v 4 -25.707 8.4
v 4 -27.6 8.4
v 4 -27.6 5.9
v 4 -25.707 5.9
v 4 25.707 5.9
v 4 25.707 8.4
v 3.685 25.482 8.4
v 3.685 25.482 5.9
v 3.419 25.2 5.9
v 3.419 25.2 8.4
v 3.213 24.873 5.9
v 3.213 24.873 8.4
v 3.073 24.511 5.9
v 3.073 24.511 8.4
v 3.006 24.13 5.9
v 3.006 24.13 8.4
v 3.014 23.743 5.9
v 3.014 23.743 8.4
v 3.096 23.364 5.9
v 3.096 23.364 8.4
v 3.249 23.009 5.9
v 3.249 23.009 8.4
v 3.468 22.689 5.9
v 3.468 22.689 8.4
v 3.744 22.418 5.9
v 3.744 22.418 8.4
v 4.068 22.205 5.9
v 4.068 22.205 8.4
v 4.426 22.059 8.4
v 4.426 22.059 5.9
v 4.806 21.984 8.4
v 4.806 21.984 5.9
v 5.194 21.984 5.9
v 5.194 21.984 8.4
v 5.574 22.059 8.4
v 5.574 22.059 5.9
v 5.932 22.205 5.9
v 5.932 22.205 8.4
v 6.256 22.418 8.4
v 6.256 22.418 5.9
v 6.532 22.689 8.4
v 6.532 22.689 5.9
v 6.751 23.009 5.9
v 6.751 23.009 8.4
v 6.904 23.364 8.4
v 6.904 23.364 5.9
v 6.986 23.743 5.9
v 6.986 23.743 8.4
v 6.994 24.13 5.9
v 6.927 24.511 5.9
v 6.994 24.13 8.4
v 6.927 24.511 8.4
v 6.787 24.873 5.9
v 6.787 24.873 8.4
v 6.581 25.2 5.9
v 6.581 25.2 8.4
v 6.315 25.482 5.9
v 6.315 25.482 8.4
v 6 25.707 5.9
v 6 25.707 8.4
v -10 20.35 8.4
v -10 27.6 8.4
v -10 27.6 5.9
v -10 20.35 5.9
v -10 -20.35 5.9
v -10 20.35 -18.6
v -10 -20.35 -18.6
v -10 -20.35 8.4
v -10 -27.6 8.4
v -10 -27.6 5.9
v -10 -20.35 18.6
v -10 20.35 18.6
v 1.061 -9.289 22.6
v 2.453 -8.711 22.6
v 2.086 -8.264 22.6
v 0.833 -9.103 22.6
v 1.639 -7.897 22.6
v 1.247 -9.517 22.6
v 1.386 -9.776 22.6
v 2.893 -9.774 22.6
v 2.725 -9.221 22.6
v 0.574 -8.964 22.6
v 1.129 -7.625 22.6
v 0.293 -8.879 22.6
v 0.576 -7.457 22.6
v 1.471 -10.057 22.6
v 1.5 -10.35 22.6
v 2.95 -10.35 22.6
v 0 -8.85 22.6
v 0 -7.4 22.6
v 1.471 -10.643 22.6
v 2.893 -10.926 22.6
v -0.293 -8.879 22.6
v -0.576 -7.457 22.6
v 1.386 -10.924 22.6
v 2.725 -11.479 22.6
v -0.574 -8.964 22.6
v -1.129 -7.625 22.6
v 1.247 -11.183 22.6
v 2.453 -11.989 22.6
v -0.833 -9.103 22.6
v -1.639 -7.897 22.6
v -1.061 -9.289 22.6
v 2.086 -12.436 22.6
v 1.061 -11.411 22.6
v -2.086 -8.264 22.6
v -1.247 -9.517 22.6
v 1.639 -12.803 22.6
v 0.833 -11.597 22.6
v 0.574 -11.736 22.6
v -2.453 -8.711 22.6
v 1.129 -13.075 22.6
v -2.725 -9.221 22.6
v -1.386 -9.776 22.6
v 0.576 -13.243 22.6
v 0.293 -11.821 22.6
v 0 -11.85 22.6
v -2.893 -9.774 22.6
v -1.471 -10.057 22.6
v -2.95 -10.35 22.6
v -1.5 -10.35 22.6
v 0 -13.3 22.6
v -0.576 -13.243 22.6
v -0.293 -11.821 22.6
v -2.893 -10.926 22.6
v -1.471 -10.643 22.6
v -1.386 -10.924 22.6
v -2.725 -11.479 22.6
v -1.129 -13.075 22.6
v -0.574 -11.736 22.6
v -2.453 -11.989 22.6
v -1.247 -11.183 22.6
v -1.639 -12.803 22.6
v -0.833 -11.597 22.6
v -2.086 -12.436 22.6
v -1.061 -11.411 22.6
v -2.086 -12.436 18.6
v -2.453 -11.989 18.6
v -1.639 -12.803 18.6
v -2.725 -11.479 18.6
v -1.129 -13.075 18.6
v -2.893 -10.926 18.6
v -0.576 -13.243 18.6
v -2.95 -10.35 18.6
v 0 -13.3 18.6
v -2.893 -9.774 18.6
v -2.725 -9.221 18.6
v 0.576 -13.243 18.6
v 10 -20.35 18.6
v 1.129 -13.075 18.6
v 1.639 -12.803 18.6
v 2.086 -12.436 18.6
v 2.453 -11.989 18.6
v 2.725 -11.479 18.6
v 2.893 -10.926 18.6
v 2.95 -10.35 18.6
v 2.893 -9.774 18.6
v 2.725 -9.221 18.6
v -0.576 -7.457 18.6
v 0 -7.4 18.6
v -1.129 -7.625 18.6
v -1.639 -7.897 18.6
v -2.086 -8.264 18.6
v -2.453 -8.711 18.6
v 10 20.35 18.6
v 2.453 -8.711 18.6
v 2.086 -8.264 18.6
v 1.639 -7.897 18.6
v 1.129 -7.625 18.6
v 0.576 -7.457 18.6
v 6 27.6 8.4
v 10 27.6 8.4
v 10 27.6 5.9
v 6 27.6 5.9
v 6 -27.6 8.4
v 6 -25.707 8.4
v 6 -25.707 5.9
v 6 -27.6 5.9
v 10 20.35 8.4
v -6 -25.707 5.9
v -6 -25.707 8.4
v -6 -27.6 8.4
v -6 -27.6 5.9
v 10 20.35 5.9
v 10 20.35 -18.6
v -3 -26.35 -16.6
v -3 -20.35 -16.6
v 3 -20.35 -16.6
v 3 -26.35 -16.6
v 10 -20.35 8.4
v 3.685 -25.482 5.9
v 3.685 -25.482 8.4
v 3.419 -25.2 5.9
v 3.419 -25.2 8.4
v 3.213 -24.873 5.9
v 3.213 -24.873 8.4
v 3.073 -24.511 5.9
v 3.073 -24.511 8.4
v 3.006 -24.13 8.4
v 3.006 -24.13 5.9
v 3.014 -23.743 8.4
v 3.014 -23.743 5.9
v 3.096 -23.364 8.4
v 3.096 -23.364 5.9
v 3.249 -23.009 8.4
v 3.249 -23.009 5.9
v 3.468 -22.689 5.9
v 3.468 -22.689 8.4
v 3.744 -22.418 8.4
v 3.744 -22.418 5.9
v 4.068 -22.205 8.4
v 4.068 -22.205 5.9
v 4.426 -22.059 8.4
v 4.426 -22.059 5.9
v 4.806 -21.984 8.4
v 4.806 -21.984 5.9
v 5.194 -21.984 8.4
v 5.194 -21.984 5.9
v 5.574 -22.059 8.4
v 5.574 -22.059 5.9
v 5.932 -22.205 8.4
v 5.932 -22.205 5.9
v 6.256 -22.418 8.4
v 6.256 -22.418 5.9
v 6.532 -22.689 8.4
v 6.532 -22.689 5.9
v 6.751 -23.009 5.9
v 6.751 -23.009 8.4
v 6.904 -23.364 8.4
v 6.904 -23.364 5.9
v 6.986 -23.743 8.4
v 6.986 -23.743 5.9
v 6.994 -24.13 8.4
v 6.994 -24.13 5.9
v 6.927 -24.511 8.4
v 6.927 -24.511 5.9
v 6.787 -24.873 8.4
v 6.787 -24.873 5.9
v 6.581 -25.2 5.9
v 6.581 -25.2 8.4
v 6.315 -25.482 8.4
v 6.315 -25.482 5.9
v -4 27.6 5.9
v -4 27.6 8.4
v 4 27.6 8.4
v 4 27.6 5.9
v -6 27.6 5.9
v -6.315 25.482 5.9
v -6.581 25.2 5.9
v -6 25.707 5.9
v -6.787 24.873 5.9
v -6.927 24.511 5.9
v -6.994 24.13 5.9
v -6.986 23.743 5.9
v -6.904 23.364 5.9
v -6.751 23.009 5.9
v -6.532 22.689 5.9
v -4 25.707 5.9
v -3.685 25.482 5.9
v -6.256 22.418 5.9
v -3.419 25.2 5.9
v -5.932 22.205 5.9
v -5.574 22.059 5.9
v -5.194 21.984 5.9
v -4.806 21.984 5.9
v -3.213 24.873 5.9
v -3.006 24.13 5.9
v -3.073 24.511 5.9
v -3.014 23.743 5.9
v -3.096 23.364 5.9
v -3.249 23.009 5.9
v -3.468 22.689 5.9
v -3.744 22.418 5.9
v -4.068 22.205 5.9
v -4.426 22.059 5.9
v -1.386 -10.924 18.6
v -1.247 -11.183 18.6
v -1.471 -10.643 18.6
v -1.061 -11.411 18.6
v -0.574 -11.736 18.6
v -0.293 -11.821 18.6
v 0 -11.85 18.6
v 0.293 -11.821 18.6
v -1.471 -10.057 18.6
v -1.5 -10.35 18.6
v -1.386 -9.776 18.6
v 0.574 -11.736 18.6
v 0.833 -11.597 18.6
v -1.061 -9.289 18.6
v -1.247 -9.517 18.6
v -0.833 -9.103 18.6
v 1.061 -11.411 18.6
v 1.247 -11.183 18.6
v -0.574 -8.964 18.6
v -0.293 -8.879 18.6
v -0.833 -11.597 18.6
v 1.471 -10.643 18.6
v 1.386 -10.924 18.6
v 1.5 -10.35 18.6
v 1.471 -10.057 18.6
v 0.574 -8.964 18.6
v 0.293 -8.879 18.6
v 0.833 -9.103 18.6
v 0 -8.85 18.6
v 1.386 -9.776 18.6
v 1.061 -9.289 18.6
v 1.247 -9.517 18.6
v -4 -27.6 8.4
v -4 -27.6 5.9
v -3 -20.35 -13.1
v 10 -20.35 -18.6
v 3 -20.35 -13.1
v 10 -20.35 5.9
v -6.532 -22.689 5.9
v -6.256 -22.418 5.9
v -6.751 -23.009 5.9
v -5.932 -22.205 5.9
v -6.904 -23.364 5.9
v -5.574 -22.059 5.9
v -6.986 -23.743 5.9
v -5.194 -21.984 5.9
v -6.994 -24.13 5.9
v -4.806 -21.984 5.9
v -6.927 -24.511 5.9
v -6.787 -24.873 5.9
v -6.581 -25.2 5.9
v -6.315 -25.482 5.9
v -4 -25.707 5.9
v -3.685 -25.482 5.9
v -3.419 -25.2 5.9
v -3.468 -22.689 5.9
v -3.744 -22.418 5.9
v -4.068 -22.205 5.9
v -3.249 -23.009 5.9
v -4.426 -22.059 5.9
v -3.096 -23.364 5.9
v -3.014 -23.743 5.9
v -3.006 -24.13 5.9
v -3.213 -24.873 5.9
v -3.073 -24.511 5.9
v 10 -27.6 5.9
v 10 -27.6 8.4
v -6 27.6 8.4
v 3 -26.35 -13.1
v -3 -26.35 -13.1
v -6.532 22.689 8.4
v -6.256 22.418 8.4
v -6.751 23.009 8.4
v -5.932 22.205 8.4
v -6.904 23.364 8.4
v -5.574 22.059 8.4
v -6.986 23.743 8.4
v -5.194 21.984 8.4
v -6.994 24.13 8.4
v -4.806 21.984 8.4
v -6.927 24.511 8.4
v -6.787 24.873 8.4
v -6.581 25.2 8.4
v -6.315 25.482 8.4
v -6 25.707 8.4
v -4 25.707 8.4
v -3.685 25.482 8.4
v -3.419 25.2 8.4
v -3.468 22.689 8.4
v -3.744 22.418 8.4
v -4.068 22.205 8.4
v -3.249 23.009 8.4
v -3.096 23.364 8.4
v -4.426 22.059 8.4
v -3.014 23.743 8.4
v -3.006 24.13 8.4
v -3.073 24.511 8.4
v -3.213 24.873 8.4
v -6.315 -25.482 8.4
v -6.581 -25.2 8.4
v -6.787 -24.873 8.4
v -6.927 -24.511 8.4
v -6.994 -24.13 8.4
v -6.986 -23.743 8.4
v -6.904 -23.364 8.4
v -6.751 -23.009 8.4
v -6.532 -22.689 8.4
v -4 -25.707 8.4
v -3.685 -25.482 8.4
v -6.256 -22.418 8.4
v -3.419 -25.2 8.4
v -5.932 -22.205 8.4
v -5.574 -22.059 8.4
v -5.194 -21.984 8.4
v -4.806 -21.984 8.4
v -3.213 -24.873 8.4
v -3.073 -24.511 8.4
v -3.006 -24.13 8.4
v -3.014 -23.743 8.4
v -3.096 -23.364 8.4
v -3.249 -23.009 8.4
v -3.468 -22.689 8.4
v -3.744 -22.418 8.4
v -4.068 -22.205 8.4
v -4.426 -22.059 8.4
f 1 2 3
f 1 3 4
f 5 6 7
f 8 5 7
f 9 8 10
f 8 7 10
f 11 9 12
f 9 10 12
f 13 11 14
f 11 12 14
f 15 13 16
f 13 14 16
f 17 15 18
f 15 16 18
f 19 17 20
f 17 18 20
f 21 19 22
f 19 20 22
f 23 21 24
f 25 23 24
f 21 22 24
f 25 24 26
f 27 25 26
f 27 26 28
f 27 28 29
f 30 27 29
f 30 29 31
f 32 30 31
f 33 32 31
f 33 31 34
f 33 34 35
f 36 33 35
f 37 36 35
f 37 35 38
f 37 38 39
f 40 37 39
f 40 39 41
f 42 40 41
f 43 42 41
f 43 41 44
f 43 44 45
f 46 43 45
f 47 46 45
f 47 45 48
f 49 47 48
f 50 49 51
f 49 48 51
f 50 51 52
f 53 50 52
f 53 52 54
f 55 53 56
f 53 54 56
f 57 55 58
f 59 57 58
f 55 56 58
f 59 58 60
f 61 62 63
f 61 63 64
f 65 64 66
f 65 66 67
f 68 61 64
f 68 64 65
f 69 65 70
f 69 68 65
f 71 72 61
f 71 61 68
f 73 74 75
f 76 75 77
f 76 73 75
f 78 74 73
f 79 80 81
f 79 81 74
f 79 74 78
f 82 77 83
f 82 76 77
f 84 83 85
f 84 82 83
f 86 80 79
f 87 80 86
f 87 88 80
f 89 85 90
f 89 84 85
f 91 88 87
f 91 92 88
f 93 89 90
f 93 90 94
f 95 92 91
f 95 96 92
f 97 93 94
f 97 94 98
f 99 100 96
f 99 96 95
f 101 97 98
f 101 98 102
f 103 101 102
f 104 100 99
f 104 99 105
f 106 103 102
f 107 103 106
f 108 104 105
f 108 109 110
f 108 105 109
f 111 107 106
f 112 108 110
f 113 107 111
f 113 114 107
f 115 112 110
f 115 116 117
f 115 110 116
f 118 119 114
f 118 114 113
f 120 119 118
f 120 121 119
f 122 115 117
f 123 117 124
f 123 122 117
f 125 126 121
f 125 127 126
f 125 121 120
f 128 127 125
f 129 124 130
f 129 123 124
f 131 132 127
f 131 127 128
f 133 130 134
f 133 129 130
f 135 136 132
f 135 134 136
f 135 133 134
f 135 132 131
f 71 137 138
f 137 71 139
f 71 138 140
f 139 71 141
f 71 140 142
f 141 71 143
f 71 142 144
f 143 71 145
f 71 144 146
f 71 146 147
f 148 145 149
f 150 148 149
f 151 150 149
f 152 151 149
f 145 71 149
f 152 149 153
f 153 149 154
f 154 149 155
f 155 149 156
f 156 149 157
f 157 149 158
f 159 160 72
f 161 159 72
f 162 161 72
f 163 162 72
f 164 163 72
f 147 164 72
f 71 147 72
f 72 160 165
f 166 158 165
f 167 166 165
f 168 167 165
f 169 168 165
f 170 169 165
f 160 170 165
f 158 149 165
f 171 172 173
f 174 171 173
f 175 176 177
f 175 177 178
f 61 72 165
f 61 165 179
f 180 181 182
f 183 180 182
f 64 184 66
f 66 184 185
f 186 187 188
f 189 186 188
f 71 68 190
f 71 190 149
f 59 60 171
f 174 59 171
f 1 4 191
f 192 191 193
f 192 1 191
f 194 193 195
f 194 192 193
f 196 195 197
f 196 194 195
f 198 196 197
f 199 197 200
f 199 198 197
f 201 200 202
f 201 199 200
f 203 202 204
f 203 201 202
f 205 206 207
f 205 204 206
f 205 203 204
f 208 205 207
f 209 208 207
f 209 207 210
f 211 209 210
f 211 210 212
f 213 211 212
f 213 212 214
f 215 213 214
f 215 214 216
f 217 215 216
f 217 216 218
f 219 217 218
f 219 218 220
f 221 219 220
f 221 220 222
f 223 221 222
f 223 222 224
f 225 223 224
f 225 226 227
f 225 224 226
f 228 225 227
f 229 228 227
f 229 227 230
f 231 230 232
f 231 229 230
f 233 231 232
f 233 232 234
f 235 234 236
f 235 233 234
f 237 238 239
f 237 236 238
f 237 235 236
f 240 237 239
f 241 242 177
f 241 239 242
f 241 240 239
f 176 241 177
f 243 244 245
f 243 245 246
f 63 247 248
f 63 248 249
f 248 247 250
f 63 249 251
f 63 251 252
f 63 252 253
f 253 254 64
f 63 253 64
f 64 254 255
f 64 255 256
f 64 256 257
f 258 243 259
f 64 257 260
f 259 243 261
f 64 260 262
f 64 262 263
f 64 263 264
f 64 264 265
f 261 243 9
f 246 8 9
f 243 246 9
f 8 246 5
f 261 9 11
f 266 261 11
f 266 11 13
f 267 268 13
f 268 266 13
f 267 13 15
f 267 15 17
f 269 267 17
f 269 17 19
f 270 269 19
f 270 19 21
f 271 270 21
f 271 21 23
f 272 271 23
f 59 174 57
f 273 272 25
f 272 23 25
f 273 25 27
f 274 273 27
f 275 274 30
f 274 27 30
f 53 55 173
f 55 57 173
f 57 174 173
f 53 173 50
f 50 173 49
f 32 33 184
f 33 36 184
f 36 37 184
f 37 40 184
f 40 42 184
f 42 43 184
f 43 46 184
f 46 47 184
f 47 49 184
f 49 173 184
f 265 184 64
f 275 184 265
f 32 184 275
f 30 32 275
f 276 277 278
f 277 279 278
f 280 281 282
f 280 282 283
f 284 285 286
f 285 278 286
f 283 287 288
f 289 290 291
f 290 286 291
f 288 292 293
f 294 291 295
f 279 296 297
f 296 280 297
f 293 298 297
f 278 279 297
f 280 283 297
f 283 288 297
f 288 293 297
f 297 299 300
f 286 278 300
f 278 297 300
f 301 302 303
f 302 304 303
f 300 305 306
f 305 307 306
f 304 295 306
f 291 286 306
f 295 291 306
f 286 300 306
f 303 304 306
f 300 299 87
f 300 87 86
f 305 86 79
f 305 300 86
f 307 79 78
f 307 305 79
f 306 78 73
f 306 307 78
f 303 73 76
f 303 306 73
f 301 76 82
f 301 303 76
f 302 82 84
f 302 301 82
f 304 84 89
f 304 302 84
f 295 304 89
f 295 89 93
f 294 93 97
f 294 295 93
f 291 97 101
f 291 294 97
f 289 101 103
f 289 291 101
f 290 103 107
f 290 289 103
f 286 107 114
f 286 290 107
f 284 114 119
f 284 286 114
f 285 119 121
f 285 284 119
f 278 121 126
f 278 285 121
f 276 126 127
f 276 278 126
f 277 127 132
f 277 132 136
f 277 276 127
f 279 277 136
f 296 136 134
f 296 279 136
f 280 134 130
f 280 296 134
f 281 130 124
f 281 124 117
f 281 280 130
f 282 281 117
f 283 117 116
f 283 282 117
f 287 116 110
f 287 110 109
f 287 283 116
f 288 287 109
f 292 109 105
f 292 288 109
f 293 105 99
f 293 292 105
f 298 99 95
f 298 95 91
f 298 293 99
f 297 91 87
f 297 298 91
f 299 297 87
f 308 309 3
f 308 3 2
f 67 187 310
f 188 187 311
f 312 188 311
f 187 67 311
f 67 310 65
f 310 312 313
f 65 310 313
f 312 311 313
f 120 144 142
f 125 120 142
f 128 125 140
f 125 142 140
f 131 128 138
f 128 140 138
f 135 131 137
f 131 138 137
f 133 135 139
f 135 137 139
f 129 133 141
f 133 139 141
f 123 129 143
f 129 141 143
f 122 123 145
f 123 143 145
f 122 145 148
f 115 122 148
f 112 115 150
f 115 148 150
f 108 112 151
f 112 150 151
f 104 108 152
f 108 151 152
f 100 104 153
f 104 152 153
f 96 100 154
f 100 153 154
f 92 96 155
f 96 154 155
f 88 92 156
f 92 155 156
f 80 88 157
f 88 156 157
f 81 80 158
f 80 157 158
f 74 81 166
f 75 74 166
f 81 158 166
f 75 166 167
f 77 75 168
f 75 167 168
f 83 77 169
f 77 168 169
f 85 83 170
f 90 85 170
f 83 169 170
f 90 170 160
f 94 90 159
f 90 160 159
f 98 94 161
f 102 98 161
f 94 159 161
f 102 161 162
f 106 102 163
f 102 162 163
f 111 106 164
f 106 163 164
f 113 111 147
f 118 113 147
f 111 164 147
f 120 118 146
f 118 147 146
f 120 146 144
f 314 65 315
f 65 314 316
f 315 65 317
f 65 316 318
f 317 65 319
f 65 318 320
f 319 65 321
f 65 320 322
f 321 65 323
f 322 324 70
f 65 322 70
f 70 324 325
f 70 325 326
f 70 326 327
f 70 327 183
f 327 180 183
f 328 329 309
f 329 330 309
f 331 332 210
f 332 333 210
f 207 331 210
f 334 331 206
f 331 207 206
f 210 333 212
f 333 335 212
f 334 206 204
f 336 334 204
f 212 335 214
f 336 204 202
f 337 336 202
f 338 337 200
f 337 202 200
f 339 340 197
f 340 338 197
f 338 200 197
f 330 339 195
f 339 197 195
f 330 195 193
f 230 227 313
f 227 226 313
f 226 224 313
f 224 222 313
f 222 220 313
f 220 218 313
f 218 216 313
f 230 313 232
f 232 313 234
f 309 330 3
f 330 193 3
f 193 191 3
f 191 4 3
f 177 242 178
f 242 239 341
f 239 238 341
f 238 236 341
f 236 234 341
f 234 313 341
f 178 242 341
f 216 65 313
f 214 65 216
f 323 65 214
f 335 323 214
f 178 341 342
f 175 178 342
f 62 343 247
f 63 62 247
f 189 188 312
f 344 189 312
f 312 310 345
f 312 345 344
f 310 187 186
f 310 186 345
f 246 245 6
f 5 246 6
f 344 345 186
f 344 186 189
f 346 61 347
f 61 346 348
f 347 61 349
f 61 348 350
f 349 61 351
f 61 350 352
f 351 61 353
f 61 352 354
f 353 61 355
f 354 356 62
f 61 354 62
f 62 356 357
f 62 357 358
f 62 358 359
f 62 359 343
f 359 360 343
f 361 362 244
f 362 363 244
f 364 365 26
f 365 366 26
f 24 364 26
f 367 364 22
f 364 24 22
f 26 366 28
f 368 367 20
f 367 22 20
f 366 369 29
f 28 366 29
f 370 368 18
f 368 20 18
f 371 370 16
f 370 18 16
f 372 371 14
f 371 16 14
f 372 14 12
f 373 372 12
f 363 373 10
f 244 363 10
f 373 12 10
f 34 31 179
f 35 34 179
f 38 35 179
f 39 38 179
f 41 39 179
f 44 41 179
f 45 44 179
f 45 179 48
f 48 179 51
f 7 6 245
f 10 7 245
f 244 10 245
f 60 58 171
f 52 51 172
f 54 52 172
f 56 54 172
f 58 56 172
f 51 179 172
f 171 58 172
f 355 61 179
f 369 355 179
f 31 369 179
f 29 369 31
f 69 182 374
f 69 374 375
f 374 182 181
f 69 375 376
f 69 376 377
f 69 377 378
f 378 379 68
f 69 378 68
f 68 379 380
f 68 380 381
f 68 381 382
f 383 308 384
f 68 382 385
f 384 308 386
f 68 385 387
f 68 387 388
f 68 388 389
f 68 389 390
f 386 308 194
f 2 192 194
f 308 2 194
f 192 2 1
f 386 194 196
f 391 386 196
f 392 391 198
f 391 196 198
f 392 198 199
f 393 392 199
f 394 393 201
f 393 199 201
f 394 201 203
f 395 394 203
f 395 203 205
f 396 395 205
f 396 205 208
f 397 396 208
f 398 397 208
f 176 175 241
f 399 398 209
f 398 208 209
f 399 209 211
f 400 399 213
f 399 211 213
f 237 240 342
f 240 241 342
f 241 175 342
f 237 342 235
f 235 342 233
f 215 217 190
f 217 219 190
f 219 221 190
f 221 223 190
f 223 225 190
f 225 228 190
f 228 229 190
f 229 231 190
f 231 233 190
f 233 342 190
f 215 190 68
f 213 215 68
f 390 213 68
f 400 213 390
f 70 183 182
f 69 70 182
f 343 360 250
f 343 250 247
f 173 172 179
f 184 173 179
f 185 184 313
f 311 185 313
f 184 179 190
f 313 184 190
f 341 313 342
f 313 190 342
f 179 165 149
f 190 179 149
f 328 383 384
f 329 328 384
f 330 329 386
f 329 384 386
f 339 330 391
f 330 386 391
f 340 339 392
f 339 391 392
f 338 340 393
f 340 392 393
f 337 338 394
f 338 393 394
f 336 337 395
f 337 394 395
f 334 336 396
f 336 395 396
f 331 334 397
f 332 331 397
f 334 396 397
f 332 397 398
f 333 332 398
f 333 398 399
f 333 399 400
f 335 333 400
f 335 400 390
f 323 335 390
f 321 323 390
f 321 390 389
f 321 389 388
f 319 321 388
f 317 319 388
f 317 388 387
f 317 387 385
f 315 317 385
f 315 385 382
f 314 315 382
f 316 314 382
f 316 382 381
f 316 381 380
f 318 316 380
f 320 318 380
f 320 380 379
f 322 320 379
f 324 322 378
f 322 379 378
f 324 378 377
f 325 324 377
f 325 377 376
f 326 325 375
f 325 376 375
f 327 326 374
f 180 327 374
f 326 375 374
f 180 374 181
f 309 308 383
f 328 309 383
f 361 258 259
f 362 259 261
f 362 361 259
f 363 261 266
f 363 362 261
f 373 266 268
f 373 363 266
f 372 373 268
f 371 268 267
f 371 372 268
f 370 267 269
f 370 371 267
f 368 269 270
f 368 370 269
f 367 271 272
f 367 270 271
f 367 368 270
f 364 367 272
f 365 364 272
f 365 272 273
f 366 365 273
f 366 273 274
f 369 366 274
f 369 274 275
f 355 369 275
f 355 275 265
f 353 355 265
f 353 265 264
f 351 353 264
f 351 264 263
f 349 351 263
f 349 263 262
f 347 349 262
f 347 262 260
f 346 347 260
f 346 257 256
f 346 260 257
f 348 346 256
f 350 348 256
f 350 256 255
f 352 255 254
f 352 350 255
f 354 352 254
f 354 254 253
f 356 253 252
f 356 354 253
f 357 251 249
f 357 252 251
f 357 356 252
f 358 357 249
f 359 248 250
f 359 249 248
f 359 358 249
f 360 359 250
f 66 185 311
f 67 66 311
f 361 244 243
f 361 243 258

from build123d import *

# Parameters (mm, degrees)
BOSS_EXTRUDE1_DEPTH = 10
CUT_EXTRUDE1_DEPTH  = 40.884332764
SKETCH5_W           = 6
SKETCH5_H           = 3.5
BOSS_EXTRUDE2_DEPTH = 6
SKETCH2_R           = 2.95
SKETCH2_R_2         = 1.5
BOSS_EXTRUDE3_DEPTH = 4


with BuildPart() as part:
    # Sketch1 → Boss-Extrude1 (new, symmetric)
    with BuildSketch(Plane.YZ):
        Polygon((-20.35, 5.9), (-27.6, 5.9), (-27.6, 8.4), (-20.35, 8.4), (-20.35, 18.6), (20.35, 18.6), (20.35, 8.4), (27.6, 8.4), (27.6, 5.9), (20.35, 5.9), (20.35, -18.6), (-20.35, -18.6), align=None)
    extrude(amount=BOSS_EXTRUDE1_DEPTH, both=True)

    # Sketch4 → Cut-Extrude1 (cut, through all)
    with BuildSketch(Plane.XY.offset(8.4)):
        with BuildLine():
            Line((-6, -25.707050808), (-6, -27.6))
            Line((-6, -27.6), (-4, -27.6))
            Line((-4, -27.6), (-4, -25.707050808))
            ThreePointArc((-4, -25.707050808), (-5, -21.975), (-6, -25.707050808))
        make_face()
        with BuildLine():
            Line((6, -27.6), (4, -27.6))
            Line((4, -27.6), (4, -25.707050808))
            ThreePointArc((4, -25.707050808), (5, -21.975), (6, -25.707050808))
            Line((6, -25.707050808), (6, -27.6))
        make_face()
    cut_extrude1 = extrude(amount=-CUT_EXTRUDE1_DEPTH, mode=Mode.SUBTRACT)

    # Mirror1: Cut-Extrude1 across plane
    add(cut_extrude1.mirror(Plane.ZX), mode=Mode.SUBTRACT)

    # Sketch5 → Boss-Extrude2 (add)
    with BuildSketch(Plane.XZ.offset(20.35)):
        with Locations((0, -14.85)):
            Rectangle(SKETCH5_W, SKETCH5_H)
    extrude(amount=BOSS_EXTRUDE2_DEPTH)

    # Sketch2 → Boss-Extrude3 (add)
    with BuildSketch(Plane.XY.offset(18.6)):
        with Locations(Location((0, -10.35, 0), (0, 0, 180))):
            Circle(SKETCH2_R)
        with Locations((0, -10.35)):
            Circle(SKETCH2_R_2, mode=Mode.SUBTRACT)
    extrude(amount=BOSS_EXTRUDE3_DEPTH)


solid = part.part
